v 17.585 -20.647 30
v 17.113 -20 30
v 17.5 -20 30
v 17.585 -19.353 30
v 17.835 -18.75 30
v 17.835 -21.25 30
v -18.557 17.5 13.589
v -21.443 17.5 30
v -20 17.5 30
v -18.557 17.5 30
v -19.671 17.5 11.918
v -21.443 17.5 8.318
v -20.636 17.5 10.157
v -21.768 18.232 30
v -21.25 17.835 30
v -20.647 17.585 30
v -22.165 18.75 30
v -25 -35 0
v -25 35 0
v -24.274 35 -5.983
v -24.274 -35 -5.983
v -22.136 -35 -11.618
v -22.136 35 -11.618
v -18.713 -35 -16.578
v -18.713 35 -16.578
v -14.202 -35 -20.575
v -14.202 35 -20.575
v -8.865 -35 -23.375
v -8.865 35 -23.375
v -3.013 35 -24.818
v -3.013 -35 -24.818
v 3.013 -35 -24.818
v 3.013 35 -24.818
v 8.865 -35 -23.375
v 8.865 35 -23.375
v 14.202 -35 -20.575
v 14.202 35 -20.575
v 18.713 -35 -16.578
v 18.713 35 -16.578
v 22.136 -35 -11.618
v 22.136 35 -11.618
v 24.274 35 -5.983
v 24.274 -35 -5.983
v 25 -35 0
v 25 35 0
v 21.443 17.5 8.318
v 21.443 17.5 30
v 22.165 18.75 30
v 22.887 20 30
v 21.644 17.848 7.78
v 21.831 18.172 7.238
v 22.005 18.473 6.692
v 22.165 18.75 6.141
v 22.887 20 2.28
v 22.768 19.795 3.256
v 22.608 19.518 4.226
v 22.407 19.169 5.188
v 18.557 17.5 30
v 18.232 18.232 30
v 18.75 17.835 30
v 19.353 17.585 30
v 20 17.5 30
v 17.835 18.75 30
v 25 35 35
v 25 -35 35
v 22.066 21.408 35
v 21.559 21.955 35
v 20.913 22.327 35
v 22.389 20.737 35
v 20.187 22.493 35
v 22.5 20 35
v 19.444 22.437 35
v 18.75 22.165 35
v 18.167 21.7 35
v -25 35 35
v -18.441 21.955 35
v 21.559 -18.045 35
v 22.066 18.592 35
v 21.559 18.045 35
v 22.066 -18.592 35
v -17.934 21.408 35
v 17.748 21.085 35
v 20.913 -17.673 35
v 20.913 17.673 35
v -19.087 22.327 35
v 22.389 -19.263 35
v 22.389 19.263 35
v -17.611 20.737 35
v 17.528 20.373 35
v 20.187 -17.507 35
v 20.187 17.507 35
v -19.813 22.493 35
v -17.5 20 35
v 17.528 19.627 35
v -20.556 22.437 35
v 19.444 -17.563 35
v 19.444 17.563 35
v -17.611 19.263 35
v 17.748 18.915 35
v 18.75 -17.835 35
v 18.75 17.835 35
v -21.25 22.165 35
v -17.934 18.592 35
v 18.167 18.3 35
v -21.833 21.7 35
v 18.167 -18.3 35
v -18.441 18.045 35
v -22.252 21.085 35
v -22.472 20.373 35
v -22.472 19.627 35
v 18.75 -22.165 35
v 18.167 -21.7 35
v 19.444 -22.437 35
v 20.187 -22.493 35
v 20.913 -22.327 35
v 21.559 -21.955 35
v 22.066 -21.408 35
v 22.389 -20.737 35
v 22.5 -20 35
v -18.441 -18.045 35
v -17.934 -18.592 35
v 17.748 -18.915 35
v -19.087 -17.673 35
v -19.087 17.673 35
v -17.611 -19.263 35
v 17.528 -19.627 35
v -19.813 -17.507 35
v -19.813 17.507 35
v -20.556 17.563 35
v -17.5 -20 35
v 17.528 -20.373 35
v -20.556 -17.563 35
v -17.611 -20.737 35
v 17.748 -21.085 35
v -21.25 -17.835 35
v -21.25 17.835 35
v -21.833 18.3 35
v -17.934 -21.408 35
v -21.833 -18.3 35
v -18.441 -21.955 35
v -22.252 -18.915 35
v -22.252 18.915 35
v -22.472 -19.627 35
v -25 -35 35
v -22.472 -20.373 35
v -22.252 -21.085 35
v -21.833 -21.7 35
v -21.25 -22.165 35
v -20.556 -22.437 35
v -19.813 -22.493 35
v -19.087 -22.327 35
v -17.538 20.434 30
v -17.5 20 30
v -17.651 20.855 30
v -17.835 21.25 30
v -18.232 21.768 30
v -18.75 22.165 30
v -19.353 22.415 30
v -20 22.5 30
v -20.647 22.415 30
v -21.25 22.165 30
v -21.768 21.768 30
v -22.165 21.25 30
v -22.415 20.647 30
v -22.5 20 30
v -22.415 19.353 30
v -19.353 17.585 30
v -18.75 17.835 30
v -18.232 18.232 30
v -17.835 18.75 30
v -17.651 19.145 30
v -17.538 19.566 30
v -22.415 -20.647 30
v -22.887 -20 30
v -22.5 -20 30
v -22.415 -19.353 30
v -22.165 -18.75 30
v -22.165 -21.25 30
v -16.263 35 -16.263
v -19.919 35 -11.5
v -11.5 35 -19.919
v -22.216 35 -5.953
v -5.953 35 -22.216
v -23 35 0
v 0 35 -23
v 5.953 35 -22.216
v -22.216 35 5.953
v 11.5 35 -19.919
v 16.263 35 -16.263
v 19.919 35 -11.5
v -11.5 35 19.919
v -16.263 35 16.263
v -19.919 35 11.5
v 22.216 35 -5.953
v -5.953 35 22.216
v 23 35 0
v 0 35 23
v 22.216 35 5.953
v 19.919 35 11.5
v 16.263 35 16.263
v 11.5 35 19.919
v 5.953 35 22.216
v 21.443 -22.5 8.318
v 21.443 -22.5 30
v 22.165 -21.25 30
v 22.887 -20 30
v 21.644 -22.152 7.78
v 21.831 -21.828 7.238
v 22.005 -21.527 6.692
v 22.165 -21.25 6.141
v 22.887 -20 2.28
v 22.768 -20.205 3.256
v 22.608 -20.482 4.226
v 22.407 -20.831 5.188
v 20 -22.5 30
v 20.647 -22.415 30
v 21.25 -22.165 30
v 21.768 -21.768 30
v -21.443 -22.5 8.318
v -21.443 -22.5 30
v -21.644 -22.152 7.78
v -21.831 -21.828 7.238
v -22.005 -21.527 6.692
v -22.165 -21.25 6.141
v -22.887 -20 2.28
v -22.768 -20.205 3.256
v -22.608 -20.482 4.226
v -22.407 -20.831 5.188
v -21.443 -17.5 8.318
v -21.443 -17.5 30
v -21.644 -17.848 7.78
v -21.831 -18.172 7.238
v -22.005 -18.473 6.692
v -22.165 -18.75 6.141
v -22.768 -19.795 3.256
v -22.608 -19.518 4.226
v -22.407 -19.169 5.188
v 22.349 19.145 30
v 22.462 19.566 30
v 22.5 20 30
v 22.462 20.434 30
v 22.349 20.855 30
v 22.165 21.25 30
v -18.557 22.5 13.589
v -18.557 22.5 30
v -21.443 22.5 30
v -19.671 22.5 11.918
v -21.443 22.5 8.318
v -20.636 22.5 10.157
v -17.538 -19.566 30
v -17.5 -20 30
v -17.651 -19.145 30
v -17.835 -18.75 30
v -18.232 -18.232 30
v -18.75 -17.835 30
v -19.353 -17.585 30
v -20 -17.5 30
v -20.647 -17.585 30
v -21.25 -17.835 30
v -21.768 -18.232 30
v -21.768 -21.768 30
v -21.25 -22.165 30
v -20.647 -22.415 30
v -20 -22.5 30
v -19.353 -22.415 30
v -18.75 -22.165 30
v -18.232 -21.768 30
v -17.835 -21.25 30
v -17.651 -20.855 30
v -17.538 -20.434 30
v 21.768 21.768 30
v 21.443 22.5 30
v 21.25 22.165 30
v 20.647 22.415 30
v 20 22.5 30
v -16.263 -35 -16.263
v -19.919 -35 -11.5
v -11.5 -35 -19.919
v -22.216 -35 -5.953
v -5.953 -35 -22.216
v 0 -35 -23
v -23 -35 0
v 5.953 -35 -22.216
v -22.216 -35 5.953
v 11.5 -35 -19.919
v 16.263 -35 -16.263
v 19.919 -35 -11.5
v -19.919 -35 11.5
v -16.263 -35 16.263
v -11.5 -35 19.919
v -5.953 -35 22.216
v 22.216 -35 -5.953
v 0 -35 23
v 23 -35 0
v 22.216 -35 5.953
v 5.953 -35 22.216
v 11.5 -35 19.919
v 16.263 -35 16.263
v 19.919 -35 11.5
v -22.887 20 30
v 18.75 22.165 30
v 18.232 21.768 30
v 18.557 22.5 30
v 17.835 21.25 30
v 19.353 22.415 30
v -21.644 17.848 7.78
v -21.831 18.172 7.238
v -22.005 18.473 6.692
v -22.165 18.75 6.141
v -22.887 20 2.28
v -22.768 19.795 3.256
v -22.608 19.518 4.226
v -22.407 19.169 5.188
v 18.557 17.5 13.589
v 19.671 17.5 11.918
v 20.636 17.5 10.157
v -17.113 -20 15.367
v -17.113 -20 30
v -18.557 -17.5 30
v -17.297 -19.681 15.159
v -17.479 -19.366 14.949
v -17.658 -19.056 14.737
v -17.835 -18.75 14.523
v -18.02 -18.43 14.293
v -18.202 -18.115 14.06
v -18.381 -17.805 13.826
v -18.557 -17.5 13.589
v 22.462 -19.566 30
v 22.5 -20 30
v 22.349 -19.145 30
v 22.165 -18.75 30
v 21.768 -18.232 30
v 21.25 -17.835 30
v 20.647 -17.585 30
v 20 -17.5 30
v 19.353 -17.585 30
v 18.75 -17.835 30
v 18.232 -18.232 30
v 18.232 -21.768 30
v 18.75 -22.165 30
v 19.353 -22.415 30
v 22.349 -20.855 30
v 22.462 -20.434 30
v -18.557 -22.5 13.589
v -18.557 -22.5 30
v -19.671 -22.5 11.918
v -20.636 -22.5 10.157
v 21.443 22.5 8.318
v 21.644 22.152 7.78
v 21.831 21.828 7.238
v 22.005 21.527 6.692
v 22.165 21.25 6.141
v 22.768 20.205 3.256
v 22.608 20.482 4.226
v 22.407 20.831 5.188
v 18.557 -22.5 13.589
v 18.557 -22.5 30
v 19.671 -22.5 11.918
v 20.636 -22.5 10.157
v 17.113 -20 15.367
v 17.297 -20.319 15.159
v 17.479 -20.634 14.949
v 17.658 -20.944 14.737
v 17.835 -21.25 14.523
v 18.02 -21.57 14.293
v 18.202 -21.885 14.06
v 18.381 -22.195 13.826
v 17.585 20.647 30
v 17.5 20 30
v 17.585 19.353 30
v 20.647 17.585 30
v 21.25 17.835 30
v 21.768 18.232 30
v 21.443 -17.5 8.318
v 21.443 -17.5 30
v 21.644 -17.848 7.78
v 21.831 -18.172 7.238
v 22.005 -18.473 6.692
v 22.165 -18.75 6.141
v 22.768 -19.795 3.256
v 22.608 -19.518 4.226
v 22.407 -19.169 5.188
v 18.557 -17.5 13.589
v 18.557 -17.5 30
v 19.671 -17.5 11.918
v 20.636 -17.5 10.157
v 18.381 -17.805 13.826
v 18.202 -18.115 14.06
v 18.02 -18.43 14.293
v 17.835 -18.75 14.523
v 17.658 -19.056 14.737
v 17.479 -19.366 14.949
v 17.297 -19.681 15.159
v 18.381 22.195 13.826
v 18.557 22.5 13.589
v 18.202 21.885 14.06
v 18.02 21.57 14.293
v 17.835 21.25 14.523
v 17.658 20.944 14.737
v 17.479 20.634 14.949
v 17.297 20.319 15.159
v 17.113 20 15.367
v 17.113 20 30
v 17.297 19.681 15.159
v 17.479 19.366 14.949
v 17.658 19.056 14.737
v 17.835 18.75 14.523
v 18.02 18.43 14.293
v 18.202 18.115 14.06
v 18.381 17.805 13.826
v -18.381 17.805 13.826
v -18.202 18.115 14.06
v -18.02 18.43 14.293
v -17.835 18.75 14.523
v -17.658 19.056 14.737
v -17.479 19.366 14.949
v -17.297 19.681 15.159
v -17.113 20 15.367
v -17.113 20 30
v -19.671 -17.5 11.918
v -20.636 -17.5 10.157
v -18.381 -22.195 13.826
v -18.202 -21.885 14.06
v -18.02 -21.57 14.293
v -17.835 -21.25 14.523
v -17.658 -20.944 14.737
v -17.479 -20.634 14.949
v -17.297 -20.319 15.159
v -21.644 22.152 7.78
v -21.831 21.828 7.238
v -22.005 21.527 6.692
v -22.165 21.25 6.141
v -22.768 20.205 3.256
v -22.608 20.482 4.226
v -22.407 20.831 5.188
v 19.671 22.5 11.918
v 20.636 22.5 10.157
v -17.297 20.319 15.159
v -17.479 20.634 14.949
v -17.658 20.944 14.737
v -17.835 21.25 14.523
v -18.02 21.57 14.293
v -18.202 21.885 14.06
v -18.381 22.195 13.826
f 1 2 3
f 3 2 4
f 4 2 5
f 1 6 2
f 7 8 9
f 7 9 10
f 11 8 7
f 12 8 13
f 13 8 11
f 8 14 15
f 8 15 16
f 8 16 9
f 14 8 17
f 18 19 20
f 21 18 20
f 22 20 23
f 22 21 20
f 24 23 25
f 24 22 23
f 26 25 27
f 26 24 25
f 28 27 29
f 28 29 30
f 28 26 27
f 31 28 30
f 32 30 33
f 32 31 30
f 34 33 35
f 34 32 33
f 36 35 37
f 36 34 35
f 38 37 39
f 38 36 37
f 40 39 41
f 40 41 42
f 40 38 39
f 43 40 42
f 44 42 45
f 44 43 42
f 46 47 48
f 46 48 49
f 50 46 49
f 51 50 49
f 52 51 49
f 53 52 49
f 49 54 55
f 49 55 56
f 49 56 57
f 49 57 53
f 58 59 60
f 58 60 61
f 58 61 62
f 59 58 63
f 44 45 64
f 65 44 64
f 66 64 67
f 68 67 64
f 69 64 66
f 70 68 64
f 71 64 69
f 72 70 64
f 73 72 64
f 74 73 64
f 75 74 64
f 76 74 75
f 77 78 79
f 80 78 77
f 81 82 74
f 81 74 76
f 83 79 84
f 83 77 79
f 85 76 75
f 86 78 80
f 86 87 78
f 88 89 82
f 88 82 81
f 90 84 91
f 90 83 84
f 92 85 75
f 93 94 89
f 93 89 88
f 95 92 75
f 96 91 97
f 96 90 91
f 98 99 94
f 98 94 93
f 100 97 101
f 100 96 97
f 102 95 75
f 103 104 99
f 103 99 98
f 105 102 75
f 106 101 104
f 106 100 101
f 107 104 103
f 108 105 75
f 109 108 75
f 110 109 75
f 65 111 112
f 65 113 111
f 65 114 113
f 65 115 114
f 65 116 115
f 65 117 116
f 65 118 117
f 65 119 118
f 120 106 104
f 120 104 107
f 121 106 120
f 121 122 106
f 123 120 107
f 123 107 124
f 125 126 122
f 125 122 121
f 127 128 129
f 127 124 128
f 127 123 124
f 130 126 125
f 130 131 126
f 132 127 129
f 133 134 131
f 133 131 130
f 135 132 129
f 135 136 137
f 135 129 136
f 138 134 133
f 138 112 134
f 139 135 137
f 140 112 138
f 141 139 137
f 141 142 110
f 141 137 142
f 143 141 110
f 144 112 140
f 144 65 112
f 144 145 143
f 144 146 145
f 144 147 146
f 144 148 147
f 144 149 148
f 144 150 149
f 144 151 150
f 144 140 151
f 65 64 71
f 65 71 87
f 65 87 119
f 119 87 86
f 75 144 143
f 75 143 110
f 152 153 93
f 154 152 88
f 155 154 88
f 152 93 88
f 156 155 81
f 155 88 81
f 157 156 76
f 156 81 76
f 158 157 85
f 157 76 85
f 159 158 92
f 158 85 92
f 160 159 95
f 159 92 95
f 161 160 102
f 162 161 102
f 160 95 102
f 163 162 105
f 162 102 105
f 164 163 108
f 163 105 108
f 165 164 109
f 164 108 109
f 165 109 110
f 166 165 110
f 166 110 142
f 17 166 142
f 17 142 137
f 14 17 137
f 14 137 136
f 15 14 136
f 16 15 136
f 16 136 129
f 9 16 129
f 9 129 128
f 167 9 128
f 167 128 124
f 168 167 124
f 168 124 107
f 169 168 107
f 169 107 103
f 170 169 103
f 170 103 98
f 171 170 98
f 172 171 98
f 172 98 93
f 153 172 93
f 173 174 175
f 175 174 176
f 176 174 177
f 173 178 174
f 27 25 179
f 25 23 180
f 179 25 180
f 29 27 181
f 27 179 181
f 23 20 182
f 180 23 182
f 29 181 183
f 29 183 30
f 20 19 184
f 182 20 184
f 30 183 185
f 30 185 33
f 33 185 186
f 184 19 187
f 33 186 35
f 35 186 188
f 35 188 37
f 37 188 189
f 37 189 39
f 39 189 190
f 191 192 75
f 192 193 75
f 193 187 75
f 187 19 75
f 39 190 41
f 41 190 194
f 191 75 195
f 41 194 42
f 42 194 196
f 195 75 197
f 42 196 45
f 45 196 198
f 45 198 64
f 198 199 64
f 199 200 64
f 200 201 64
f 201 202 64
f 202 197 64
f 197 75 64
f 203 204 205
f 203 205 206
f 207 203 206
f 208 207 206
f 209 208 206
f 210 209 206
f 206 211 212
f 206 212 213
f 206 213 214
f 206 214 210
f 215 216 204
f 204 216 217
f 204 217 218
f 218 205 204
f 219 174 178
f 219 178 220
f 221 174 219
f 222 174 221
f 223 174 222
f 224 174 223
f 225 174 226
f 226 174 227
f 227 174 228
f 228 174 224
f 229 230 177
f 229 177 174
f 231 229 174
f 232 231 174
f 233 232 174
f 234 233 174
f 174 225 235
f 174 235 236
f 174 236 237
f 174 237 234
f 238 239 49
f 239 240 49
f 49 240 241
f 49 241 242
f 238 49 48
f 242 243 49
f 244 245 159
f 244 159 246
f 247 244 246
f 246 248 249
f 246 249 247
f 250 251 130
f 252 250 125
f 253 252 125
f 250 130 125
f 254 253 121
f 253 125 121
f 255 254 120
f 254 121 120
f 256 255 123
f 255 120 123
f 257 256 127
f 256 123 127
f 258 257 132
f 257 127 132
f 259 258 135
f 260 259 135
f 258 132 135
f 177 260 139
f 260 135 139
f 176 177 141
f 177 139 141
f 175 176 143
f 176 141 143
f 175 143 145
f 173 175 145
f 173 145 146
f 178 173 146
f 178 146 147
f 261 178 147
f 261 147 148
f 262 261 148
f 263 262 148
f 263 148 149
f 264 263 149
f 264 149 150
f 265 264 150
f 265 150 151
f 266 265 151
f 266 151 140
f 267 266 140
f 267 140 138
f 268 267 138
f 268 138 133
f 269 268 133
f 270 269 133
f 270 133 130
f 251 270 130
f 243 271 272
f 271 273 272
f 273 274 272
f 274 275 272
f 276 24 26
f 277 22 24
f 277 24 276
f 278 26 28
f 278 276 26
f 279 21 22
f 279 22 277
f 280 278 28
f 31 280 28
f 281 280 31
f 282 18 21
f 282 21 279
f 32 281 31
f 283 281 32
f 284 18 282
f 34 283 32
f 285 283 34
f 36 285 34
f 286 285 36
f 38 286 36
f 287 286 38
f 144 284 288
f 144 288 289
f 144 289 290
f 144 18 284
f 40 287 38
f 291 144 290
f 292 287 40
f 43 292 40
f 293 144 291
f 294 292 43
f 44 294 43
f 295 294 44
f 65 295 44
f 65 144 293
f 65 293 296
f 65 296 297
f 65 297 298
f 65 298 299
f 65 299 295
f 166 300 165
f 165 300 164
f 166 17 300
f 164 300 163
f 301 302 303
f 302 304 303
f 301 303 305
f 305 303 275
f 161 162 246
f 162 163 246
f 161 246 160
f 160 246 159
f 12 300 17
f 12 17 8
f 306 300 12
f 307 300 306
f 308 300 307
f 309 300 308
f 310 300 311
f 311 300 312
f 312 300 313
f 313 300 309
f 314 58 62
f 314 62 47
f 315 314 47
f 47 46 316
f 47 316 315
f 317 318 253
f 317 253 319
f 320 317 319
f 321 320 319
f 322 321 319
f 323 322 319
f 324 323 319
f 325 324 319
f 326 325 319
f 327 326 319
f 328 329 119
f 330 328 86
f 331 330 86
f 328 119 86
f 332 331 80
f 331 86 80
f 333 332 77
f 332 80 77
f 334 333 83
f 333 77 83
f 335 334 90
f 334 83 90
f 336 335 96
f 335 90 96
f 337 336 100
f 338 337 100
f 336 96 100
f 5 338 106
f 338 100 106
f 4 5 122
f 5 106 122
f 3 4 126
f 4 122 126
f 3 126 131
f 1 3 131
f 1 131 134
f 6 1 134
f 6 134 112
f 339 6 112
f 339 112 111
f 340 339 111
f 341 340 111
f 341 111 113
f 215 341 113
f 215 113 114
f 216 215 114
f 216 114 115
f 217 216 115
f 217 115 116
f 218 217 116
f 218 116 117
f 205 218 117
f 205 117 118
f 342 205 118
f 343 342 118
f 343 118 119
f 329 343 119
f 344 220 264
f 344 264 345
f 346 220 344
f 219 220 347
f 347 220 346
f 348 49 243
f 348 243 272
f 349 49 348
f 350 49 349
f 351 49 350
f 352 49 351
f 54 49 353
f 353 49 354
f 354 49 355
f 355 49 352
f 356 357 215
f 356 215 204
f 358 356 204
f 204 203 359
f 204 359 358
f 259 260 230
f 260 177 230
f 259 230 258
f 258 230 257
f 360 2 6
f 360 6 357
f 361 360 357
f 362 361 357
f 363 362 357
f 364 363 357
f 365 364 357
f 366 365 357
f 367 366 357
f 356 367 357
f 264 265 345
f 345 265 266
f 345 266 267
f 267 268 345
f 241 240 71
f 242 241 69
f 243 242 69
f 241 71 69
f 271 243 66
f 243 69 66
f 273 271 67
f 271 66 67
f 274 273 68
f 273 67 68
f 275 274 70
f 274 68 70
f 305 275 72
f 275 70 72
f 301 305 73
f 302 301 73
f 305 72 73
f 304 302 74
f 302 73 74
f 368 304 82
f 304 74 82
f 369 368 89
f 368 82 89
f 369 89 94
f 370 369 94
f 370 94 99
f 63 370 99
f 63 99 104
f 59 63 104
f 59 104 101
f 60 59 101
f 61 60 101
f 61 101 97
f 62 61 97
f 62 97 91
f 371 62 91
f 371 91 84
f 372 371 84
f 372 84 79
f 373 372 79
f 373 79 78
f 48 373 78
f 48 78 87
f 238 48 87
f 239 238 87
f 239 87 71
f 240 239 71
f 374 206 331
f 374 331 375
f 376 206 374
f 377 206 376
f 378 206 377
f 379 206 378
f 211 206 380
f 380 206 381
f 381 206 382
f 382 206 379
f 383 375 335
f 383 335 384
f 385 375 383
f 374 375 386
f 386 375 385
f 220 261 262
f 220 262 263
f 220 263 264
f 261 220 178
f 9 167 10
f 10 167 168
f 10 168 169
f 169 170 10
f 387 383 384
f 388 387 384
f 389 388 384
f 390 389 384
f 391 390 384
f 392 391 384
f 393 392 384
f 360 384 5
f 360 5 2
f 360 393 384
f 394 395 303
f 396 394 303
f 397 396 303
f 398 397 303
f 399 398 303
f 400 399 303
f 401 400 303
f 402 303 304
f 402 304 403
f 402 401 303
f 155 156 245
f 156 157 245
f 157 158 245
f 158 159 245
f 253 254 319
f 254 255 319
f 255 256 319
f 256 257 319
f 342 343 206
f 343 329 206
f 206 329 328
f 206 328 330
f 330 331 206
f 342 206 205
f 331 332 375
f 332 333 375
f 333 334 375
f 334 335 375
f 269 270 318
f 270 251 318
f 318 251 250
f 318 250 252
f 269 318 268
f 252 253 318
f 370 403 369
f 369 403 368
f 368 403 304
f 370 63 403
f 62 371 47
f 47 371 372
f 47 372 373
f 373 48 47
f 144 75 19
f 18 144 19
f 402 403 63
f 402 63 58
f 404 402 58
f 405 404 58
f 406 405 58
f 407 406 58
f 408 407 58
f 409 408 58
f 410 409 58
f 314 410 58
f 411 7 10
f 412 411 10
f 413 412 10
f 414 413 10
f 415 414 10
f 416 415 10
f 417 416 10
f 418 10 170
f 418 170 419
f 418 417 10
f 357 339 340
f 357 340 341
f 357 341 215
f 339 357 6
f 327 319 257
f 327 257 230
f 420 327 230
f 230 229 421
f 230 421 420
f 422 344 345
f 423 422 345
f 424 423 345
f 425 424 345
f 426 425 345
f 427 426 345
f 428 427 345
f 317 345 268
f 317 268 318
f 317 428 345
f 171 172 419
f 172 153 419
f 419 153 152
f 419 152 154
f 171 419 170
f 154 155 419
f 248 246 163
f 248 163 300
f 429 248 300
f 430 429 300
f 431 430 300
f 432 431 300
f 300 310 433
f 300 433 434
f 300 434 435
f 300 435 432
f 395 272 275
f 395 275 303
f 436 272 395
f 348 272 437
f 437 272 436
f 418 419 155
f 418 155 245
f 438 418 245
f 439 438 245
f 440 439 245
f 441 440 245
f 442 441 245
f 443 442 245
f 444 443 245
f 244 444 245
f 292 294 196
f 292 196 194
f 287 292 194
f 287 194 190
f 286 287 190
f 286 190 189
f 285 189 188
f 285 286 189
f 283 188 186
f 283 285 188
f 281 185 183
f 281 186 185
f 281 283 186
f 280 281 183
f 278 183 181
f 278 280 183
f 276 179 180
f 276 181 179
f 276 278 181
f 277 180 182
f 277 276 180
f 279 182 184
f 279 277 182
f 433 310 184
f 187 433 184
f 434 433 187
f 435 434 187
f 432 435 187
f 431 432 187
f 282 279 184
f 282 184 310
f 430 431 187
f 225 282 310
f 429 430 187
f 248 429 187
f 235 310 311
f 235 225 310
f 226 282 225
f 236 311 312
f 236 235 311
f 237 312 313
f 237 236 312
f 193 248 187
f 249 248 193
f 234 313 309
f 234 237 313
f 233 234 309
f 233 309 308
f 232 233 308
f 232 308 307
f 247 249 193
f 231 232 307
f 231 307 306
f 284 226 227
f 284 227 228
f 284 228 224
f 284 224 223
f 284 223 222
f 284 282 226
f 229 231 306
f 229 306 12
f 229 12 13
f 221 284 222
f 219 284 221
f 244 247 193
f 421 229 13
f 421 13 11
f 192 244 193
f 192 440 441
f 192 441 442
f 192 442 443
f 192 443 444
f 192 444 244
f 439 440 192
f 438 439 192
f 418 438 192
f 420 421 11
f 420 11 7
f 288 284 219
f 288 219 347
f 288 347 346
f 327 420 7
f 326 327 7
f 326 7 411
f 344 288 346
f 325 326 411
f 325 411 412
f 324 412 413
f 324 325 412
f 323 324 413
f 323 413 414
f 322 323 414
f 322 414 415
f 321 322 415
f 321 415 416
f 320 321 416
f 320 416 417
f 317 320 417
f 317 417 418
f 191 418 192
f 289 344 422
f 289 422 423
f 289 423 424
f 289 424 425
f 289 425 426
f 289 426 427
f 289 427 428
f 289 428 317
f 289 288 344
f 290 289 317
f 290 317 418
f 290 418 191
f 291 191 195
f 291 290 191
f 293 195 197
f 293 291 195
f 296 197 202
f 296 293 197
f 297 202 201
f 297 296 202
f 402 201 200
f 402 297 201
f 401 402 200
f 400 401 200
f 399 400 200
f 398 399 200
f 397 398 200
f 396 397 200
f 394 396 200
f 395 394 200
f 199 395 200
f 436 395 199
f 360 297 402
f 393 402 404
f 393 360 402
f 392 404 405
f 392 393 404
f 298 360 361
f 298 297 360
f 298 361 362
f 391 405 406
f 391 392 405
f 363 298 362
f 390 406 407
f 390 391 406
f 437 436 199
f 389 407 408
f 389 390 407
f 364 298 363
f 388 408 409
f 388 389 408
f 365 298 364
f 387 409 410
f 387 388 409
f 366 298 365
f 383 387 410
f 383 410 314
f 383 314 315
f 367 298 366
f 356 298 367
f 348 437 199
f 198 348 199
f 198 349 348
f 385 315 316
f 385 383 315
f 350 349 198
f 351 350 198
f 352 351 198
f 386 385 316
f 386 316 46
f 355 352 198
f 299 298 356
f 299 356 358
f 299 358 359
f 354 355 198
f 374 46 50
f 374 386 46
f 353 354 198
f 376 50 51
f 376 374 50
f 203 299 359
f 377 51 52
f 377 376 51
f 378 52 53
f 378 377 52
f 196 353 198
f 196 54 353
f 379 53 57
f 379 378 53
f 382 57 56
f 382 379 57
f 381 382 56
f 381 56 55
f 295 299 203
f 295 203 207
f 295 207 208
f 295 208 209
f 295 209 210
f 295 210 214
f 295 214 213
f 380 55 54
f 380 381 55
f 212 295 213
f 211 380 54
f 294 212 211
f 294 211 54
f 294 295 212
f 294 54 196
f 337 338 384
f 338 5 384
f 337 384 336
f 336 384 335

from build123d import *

# Parameters (mm, degrees)
F1_DEPTH = 35
F2_R     = 2.5
F3_DEPTH = 35.001
F4_DEPTH = 35
F6_DEPTH = 30


with BuildPart() as f1:
    # F0 (on Front) → F1 (new body, symmetric)
    with BuildSketch(Plane.XZ):
        with BuildLine():
            ThreePointArc((-25, 0), (0, 25), (25, 0))
            Line((25, 0), (25, 35))
            Line((25, 35), (-25, 35))
            Line((-25, 35), (-25, 0))
        make_face()
        with BuildLine():
            Line((23, 0), (25, 0))
            ThreePointArc((25, 0), (0, 25), (-25, 0))
            Line((-25, 0), (-23, 0))
            ThreePointArc((-23, 0), (0, 23), (23, 0))
        make_face()
    extrude(amount=F1_DEPTH, both=True)

    # F2 (on face) → F3 (cut, through all)
    with BuildSketch(Plane.XY.offset(35)):
        with Locations((20, 20)):
            Circle(F2_R)
        with Locations((-20, 20)):
            Circle(F2_R)
        with Locations((-20, -20)):
            Circle(F2_R)
        with Locations((20, -20)):
            Circle(F2_R)
    extrude(amount=-F3_DEPTH, mode=Mode.SUBTRACT)

    # F0 (on Front) → F4 (join, symmetric)
    with BuildSketch(Plane.XZ):
        with BuildLine():
            ThreePointArc((-25, 0), (0, -25), (25, 0))
            Line((25, 0), (23, 0))
            ThreePointArc((23, 0), (0, -23), (-23, 0))
            Line((-23, 0), (-25, 0))
        make_face()
    extrude(amount=F4_DEPTH, both=True)

    # F5 (on Top) → F6 (cut)
    with BuildSketch(Plane.XY):
        Polygon((-17.1132486541, -20), (-18.556624327, -17.5), (-21.443375673, -17.5), (-22.8867513459, -20), (-21.443375673, -22.5), (-18.556624327, -22.5), align=None)
        Polygon((21.443375673, -17.5), (18.556624327, -17.5), (17.1132486541, -20), (18.556624327, -22.5), (21.443375673, -22.5), (22.8867513459, -20), align=None)
        Polygon((-21.443375673, 17.5), (-18.556624327, 17.5), (-17.1132486541, 20), (-18.556624327, 22.5), (-21.443375673, 22.5), (-22.8867513459, 20), align=None)
        Polygon((17.1132486541, 20), (18.556624327, 17.5), (21.443375673, 17.5), (22.8867513459, 20), (21.443375673, 22.5), (18.556624327, 22.5), align=None)
    extrude(amount=F6_DEPTH, mode=Mode.SUBTRACT)


solid = f1.part
